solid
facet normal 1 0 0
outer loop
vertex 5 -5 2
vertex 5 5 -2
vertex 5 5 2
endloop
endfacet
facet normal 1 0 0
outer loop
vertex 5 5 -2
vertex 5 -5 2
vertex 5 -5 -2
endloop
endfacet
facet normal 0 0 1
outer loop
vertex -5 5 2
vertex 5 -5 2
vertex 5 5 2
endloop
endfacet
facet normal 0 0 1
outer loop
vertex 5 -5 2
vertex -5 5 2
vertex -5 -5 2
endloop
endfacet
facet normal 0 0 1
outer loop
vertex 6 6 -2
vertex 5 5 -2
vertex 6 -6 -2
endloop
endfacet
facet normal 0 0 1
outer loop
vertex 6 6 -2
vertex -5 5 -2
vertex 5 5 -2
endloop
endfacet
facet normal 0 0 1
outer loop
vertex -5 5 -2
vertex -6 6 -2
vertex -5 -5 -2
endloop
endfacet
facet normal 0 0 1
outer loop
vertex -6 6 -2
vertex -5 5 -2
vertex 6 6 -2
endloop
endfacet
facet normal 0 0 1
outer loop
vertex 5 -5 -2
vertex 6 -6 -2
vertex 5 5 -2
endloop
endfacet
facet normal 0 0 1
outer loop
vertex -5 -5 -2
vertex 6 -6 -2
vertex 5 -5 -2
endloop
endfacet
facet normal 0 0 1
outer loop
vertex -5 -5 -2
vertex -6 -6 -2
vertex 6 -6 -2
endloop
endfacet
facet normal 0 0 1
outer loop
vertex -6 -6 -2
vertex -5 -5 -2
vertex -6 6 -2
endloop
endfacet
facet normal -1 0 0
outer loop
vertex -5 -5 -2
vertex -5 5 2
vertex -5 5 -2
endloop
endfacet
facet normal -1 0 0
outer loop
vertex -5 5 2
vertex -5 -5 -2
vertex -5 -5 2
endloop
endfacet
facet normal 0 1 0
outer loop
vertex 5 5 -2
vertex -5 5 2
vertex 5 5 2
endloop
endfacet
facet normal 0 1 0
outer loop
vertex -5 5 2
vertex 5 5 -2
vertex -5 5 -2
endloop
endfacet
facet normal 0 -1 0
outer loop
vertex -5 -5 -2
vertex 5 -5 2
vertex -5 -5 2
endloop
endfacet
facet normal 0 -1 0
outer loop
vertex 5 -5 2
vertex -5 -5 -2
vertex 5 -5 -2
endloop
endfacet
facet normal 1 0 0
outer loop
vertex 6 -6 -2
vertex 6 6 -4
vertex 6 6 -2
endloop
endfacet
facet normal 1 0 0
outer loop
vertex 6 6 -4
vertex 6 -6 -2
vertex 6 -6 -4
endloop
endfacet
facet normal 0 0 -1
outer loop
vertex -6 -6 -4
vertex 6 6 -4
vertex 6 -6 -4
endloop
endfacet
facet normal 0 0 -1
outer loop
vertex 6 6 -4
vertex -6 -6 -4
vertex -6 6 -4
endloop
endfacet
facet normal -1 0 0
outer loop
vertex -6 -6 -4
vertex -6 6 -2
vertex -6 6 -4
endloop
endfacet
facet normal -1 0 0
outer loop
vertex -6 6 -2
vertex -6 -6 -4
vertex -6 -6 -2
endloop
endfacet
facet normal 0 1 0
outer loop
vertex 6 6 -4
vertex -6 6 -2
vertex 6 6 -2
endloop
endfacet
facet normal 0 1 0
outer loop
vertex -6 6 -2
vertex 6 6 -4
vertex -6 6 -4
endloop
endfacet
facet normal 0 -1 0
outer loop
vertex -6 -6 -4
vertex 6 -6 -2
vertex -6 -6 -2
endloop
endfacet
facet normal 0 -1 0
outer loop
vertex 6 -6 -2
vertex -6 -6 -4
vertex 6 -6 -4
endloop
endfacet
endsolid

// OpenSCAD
// need to figure out a inside / outside poyine + extrusion

height = 4;

cube([10,10,height], center = true);


translate( [ 0,0,-3]) { 
  color( "red") {
     cube([12,12, 2], center = true);
    } 
}
